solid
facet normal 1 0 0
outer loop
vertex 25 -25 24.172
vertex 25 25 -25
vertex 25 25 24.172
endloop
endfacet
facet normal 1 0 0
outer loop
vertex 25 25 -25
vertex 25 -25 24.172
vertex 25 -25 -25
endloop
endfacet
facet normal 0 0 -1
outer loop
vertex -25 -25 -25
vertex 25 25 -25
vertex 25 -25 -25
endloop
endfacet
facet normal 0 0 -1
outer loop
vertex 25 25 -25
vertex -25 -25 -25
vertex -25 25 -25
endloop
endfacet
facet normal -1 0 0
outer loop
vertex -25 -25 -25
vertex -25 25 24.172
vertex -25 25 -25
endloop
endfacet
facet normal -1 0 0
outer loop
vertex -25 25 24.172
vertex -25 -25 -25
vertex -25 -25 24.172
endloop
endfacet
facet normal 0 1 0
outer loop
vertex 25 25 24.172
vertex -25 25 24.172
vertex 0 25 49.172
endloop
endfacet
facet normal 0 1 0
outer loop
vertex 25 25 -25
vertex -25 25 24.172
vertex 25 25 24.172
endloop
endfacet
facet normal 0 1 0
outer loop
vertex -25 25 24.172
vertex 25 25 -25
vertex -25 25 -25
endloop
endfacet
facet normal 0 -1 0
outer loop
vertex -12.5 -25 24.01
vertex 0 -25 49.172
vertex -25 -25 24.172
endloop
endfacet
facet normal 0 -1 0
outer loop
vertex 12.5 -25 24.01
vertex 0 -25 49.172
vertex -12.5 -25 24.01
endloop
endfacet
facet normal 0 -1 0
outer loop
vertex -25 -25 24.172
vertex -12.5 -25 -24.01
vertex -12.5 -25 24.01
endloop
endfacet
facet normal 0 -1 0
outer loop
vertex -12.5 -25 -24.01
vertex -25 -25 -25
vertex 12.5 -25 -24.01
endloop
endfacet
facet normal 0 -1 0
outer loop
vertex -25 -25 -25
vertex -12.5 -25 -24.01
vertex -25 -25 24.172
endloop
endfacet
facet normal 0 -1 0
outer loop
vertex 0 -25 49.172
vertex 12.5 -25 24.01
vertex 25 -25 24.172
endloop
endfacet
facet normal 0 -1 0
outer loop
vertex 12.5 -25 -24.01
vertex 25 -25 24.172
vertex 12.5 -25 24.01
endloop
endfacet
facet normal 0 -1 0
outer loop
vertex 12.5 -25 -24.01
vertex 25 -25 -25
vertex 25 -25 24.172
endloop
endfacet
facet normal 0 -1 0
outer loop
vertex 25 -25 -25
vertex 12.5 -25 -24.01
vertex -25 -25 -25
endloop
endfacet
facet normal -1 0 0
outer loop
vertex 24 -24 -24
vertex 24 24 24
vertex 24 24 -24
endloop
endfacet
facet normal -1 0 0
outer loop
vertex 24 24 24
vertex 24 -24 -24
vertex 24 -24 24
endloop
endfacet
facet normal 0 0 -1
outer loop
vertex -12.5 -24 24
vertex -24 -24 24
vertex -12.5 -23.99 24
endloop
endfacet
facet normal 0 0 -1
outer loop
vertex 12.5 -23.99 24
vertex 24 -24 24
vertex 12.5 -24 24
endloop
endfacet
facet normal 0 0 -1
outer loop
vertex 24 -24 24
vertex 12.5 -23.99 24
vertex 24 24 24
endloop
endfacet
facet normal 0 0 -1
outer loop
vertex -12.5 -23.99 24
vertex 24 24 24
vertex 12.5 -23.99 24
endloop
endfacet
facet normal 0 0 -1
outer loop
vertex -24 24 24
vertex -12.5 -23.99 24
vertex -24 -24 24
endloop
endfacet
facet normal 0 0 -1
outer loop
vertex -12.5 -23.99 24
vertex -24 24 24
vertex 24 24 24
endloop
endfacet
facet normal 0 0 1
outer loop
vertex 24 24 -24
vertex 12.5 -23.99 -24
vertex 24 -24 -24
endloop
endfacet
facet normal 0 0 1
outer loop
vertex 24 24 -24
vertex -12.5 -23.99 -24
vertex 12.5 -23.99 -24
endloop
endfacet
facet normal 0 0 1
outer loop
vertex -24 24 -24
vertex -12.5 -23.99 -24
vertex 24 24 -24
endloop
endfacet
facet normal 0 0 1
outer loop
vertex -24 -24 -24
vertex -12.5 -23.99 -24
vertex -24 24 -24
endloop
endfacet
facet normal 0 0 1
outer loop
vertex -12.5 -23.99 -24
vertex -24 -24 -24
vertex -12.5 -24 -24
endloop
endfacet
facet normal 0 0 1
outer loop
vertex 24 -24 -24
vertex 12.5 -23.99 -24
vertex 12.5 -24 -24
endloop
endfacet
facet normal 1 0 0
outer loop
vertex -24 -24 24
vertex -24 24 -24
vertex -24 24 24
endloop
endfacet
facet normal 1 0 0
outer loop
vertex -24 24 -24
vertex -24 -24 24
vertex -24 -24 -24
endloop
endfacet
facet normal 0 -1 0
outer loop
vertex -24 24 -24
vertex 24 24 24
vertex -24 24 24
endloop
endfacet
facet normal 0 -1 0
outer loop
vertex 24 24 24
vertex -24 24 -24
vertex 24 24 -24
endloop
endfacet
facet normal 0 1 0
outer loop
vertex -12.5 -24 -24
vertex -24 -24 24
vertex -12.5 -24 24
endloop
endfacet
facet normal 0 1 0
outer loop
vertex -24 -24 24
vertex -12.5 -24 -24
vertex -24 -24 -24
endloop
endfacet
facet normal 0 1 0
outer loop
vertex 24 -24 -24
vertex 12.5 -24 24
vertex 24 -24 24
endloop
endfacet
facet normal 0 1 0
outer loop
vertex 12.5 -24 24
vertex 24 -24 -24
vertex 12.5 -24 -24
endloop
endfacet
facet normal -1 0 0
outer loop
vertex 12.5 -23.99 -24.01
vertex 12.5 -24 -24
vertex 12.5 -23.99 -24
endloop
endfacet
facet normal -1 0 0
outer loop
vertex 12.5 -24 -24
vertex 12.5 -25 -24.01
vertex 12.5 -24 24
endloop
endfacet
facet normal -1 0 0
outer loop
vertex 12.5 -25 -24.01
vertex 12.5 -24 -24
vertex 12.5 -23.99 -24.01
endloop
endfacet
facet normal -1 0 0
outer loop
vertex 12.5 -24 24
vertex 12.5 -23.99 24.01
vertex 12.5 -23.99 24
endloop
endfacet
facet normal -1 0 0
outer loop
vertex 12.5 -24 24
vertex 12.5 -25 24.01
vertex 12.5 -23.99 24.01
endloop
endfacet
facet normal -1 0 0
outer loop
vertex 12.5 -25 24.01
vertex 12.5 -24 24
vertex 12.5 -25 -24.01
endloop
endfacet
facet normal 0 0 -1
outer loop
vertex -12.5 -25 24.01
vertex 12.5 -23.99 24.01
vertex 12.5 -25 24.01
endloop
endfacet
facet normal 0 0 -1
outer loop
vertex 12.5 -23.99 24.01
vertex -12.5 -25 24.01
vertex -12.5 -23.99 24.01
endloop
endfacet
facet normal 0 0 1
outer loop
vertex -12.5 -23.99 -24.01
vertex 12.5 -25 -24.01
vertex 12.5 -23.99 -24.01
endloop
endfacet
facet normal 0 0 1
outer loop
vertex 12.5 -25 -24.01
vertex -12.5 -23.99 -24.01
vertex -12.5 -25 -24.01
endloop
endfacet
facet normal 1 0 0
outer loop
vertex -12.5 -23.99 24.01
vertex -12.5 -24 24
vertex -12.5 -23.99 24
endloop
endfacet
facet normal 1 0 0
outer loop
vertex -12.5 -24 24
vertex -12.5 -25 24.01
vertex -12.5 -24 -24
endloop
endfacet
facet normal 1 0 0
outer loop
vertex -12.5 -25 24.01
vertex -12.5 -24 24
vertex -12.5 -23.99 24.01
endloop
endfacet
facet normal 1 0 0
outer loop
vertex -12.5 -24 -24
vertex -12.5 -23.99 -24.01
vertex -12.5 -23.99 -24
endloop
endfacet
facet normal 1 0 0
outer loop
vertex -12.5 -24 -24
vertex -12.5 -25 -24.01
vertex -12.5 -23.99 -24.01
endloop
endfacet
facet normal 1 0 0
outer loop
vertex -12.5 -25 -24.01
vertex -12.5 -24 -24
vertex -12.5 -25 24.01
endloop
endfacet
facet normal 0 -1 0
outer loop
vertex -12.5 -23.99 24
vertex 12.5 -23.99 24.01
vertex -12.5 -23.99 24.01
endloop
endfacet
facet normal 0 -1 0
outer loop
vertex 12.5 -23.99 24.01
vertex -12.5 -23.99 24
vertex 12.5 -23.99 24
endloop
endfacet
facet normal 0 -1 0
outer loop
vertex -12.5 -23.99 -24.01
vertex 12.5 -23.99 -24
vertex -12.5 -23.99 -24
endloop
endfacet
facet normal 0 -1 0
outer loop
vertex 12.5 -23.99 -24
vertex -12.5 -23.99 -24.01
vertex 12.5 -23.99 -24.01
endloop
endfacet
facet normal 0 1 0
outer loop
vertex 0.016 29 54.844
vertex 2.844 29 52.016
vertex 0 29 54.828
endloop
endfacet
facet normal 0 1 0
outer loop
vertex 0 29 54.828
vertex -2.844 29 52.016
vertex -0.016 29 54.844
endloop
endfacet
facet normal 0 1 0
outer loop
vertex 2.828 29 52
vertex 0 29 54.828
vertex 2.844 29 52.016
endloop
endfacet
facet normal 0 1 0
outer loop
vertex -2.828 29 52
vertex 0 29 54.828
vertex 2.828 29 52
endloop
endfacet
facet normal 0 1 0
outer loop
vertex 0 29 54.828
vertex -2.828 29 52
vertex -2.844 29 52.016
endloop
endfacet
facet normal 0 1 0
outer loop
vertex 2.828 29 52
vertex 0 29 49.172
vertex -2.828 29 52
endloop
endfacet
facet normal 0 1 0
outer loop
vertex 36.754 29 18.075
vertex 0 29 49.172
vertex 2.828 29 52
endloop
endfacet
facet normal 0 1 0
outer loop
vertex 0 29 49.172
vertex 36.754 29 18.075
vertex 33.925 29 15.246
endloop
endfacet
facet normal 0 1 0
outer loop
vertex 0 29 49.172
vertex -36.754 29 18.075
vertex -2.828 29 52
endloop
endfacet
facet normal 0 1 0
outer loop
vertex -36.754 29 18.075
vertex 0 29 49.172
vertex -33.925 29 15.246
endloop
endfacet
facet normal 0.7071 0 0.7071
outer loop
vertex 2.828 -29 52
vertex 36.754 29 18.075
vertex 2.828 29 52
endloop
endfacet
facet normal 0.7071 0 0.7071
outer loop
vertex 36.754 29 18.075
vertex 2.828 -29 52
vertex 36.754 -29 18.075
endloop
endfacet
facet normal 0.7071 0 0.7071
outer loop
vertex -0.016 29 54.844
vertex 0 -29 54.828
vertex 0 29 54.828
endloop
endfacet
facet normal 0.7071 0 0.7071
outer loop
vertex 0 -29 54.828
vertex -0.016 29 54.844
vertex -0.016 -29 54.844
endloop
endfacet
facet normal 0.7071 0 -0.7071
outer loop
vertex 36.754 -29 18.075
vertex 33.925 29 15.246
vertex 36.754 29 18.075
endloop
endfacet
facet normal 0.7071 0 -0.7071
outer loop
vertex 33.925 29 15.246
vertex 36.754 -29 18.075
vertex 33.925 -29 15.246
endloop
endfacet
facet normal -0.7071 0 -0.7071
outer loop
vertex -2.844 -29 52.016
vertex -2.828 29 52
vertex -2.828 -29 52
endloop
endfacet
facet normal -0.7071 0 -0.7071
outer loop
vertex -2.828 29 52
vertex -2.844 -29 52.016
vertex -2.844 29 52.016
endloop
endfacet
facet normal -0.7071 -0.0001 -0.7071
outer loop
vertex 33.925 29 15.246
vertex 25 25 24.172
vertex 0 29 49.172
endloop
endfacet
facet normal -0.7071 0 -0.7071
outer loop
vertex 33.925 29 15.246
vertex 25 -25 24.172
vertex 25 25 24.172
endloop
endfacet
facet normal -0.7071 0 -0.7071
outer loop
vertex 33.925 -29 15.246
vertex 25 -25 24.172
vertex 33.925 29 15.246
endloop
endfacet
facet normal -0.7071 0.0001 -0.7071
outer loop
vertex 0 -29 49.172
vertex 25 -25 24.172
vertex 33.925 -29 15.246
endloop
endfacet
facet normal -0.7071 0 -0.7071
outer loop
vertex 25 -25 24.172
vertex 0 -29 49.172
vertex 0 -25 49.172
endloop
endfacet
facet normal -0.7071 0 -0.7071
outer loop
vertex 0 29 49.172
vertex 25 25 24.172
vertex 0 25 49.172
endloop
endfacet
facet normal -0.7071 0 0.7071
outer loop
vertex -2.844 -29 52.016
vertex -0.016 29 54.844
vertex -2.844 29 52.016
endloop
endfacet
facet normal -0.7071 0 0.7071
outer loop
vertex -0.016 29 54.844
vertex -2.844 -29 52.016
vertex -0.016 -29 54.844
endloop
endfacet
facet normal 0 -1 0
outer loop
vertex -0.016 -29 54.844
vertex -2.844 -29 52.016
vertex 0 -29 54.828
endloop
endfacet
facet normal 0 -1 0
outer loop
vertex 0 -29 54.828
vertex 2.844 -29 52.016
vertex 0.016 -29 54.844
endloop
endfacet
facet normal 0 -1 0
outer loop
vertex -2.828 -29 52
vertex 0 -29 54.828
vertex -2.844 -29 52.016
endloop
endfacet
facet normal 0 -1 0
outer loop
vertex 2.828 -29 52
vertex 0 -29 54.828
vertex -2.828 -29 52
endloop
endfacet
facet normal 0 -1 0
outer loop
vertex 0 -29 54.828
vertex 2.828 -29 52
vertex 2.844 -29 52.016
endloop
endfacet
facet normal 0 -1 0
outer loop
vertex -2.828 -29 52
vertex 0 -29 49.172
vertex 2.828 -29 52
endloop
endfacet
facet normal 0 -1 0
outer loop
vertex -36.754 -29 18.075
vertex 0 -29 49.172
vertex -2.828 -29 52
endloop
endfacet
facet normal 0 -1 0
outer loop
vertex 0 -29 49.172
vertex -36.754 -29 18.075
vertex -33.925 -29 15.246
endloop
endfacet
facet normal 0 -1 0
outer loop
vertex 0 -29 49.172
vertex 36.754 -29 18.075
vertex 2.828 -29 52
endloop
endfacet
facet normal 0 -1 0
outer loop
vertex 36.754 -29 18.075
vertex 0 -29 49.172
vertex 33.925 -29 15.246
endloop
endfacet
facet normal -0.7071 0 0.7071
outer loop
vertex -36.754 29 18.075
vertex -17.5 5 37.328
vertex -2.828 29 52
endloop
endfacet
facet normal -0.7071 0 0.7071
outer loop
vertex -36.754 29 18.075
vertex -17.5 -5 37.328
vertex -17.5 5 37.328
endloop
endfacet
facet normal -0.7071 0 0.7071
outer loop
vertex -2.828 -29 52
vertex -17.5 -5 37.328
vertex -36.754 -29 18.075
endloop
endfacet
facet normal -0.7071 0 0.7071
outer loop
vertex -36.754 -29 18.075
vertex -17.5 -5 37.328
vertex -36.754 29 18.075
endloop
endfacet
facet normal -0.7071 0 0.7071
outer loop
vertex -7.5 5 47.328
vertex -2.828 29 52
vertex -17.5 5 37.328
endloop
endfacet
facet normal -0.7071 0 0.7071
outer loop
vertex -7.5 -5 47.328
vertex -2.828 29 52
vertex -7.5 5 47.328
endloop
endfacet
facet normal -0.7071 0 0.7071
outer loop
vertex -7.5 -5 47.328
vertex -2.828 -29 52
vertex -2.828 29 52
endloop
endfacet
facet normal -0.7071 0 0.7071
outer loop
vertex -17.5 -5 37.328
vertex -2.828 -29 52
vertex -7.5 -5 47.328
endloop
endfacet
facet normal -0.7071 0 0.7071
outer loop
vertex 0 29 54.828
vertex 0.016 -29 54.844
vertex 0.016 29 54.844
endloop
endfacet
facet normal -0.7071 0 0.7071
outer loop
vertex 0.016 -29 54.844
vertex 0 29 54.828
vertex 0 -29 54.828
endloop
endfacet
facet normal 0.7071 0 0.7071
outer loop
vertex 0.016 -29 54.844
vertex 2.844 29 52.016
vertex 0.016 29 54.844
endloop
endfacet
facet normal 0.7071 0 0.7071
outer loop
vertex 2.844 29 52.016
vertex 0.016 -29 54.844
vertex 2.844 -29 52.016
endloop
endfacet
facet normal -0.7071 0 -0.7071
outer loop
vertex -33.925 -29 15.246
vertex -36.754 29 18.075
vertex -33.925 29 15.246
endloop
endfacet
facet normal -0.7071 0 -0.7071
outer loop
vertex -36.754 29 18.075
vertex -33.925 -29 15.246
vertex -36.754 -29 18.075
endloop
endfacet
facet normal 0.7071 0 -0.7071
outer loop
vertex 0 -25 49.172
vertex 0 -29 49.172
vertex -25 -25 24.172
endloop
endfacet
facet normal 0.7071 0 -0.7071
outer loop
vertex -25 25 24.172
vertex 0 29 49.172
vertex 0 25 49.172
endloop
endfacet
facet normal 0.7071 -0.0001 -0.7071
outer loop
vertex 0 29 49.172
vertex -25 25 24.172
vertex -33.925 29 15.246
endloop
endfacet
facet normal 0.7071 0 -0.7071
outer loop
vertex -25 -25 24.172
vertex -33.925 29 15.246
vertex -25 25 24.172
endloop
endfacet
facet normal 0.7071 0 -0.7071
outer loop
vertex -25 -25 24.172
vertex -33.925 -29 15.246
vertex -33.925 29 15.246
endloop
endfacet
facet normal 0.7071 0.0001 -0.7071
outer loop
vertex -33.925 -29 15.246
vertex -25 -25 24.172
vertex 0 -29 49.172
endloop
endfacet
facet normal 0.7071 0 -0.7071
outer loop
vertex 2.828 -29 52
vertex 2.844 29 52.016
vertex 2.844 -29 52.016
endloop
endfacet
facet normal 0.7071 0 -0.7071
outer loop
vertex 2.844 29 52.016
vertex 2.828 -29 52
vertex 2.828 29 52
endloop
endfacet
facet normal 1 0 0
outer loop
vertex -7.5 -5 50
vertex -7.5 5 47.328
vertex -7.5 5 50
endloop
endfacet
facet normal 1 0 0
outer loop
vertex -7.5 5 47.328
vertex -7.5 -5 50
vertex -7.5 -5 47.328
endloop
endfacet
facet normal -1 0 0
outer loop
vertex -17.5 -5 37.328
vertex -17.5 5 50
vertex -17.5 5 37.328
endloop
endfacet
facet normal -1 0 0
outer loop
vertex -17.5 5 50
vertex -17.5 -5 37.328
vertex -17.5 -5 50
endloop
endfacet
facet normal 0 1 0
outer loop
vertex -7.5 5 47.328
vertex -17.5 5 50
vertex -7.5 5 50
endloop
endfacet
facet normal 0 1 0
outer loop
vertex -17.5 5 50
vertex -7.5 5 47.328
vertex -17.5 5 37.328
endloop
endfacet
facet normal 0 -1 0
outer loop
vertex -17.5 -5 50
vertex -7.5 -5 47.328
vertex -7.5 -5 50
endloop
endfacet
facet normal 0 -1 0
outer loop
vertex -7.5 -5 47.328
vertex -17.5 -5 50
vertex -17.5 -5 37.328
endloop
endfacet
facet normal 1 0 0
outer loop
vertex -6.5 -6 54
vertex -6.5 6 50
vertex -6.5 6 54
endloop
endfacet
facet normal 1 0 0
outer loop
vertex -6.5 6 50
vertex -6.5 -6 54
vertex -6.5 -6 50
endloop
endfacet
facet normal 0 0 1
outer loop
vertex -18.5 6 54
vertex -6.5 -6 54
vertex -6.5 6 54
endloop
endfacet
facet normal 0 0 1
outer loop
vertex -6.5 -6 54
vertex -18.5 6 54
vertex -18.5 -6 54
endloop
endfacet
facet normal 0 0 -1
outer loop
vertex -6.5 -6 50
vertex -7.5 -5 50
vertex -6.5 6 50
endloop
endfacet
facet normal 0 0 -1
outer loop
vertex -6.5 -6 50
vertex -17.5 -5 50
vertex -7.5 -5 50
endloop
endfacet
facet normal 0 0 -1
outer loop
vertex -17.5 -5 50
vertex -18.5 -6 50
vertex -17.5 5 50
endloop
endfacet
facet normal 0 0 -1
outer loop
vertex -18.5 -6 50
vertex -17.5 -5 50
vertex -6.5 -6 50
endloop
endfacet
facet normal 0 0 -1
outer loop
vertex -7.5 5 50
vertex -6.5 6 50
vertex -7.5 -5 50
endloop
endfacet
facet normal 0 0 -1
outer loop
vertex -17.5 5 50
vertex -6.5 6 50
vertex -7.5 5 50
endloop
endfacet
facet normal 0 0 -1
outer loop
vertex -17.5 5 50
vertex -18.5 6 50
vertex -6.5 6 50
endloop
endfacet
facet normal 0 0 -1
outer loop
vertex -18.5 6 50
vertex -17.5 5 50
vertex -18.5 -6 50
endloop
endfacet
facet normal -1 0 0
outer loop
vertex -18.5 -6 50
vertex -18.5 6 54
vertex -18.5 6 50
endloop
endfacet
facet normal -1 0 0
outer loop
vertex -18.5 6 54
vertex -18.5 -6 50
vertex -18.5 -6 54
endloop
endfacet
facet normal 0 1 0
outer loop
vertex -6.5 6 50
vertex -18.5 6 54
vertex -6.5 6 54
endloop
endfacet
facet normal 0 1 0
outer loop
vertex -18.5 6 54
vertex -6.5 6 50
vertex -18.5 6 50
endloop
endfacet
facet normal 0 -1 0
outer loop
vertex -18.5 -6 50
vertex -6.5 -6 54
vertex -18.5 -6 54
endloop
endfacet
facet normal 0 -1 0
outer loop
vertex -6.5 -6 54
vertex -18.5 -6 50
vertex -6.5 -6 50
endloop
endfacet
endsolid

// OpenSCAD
// CSG.scad - Basic example of CSG usage

difference() {
    cube(50, center=true);
    cube(48, center=true);
    
    translate([0, -25, 0]) {
        cube([25, 2.02, 48.02], center=true);
    }
}
translate([0, 25, 25]) {
    rotate([90, 0, 0]) {
        linear_extrude(height=50,scale=1,convexity=10) {
        polygon([[-25,0], [25,0], [0,25]]);
        }
    }
}
translate([12.5,0,-12.5])
    translate([0,0,52])
        rotate([0,45,0])
            translate([6.3,0,0])
            cube([52,58,4],center=true);

translate([-12.5,0,-12.5])
    translate([0,0,52])
        rotate([0,-45,0])
            translate([-6.3,0,0])
            cube([52,58,4],center=true);

translate([-12.5,0,25])
    translate([-5,-5,0])
        cube([10,10,27]);
translate([-12.5,0,50])
    translate([-6,-6,0])
        cube([12,12,4]);

echo(version=version());
// Written by Marius Kintel <marius@kintel.net>
//
// To the extent possible under law, the author(s) have dedicated all
// copyright and related and neighboring rights to this software to the
// public domain worldwide. This software is distributed without any
// warranty.
//
// You should have received a copy of the CC0 Public Domain
// Dedication along with this software.
// If not, see <http://creativecommons.org/publicdomain/zero/1.0/>.
